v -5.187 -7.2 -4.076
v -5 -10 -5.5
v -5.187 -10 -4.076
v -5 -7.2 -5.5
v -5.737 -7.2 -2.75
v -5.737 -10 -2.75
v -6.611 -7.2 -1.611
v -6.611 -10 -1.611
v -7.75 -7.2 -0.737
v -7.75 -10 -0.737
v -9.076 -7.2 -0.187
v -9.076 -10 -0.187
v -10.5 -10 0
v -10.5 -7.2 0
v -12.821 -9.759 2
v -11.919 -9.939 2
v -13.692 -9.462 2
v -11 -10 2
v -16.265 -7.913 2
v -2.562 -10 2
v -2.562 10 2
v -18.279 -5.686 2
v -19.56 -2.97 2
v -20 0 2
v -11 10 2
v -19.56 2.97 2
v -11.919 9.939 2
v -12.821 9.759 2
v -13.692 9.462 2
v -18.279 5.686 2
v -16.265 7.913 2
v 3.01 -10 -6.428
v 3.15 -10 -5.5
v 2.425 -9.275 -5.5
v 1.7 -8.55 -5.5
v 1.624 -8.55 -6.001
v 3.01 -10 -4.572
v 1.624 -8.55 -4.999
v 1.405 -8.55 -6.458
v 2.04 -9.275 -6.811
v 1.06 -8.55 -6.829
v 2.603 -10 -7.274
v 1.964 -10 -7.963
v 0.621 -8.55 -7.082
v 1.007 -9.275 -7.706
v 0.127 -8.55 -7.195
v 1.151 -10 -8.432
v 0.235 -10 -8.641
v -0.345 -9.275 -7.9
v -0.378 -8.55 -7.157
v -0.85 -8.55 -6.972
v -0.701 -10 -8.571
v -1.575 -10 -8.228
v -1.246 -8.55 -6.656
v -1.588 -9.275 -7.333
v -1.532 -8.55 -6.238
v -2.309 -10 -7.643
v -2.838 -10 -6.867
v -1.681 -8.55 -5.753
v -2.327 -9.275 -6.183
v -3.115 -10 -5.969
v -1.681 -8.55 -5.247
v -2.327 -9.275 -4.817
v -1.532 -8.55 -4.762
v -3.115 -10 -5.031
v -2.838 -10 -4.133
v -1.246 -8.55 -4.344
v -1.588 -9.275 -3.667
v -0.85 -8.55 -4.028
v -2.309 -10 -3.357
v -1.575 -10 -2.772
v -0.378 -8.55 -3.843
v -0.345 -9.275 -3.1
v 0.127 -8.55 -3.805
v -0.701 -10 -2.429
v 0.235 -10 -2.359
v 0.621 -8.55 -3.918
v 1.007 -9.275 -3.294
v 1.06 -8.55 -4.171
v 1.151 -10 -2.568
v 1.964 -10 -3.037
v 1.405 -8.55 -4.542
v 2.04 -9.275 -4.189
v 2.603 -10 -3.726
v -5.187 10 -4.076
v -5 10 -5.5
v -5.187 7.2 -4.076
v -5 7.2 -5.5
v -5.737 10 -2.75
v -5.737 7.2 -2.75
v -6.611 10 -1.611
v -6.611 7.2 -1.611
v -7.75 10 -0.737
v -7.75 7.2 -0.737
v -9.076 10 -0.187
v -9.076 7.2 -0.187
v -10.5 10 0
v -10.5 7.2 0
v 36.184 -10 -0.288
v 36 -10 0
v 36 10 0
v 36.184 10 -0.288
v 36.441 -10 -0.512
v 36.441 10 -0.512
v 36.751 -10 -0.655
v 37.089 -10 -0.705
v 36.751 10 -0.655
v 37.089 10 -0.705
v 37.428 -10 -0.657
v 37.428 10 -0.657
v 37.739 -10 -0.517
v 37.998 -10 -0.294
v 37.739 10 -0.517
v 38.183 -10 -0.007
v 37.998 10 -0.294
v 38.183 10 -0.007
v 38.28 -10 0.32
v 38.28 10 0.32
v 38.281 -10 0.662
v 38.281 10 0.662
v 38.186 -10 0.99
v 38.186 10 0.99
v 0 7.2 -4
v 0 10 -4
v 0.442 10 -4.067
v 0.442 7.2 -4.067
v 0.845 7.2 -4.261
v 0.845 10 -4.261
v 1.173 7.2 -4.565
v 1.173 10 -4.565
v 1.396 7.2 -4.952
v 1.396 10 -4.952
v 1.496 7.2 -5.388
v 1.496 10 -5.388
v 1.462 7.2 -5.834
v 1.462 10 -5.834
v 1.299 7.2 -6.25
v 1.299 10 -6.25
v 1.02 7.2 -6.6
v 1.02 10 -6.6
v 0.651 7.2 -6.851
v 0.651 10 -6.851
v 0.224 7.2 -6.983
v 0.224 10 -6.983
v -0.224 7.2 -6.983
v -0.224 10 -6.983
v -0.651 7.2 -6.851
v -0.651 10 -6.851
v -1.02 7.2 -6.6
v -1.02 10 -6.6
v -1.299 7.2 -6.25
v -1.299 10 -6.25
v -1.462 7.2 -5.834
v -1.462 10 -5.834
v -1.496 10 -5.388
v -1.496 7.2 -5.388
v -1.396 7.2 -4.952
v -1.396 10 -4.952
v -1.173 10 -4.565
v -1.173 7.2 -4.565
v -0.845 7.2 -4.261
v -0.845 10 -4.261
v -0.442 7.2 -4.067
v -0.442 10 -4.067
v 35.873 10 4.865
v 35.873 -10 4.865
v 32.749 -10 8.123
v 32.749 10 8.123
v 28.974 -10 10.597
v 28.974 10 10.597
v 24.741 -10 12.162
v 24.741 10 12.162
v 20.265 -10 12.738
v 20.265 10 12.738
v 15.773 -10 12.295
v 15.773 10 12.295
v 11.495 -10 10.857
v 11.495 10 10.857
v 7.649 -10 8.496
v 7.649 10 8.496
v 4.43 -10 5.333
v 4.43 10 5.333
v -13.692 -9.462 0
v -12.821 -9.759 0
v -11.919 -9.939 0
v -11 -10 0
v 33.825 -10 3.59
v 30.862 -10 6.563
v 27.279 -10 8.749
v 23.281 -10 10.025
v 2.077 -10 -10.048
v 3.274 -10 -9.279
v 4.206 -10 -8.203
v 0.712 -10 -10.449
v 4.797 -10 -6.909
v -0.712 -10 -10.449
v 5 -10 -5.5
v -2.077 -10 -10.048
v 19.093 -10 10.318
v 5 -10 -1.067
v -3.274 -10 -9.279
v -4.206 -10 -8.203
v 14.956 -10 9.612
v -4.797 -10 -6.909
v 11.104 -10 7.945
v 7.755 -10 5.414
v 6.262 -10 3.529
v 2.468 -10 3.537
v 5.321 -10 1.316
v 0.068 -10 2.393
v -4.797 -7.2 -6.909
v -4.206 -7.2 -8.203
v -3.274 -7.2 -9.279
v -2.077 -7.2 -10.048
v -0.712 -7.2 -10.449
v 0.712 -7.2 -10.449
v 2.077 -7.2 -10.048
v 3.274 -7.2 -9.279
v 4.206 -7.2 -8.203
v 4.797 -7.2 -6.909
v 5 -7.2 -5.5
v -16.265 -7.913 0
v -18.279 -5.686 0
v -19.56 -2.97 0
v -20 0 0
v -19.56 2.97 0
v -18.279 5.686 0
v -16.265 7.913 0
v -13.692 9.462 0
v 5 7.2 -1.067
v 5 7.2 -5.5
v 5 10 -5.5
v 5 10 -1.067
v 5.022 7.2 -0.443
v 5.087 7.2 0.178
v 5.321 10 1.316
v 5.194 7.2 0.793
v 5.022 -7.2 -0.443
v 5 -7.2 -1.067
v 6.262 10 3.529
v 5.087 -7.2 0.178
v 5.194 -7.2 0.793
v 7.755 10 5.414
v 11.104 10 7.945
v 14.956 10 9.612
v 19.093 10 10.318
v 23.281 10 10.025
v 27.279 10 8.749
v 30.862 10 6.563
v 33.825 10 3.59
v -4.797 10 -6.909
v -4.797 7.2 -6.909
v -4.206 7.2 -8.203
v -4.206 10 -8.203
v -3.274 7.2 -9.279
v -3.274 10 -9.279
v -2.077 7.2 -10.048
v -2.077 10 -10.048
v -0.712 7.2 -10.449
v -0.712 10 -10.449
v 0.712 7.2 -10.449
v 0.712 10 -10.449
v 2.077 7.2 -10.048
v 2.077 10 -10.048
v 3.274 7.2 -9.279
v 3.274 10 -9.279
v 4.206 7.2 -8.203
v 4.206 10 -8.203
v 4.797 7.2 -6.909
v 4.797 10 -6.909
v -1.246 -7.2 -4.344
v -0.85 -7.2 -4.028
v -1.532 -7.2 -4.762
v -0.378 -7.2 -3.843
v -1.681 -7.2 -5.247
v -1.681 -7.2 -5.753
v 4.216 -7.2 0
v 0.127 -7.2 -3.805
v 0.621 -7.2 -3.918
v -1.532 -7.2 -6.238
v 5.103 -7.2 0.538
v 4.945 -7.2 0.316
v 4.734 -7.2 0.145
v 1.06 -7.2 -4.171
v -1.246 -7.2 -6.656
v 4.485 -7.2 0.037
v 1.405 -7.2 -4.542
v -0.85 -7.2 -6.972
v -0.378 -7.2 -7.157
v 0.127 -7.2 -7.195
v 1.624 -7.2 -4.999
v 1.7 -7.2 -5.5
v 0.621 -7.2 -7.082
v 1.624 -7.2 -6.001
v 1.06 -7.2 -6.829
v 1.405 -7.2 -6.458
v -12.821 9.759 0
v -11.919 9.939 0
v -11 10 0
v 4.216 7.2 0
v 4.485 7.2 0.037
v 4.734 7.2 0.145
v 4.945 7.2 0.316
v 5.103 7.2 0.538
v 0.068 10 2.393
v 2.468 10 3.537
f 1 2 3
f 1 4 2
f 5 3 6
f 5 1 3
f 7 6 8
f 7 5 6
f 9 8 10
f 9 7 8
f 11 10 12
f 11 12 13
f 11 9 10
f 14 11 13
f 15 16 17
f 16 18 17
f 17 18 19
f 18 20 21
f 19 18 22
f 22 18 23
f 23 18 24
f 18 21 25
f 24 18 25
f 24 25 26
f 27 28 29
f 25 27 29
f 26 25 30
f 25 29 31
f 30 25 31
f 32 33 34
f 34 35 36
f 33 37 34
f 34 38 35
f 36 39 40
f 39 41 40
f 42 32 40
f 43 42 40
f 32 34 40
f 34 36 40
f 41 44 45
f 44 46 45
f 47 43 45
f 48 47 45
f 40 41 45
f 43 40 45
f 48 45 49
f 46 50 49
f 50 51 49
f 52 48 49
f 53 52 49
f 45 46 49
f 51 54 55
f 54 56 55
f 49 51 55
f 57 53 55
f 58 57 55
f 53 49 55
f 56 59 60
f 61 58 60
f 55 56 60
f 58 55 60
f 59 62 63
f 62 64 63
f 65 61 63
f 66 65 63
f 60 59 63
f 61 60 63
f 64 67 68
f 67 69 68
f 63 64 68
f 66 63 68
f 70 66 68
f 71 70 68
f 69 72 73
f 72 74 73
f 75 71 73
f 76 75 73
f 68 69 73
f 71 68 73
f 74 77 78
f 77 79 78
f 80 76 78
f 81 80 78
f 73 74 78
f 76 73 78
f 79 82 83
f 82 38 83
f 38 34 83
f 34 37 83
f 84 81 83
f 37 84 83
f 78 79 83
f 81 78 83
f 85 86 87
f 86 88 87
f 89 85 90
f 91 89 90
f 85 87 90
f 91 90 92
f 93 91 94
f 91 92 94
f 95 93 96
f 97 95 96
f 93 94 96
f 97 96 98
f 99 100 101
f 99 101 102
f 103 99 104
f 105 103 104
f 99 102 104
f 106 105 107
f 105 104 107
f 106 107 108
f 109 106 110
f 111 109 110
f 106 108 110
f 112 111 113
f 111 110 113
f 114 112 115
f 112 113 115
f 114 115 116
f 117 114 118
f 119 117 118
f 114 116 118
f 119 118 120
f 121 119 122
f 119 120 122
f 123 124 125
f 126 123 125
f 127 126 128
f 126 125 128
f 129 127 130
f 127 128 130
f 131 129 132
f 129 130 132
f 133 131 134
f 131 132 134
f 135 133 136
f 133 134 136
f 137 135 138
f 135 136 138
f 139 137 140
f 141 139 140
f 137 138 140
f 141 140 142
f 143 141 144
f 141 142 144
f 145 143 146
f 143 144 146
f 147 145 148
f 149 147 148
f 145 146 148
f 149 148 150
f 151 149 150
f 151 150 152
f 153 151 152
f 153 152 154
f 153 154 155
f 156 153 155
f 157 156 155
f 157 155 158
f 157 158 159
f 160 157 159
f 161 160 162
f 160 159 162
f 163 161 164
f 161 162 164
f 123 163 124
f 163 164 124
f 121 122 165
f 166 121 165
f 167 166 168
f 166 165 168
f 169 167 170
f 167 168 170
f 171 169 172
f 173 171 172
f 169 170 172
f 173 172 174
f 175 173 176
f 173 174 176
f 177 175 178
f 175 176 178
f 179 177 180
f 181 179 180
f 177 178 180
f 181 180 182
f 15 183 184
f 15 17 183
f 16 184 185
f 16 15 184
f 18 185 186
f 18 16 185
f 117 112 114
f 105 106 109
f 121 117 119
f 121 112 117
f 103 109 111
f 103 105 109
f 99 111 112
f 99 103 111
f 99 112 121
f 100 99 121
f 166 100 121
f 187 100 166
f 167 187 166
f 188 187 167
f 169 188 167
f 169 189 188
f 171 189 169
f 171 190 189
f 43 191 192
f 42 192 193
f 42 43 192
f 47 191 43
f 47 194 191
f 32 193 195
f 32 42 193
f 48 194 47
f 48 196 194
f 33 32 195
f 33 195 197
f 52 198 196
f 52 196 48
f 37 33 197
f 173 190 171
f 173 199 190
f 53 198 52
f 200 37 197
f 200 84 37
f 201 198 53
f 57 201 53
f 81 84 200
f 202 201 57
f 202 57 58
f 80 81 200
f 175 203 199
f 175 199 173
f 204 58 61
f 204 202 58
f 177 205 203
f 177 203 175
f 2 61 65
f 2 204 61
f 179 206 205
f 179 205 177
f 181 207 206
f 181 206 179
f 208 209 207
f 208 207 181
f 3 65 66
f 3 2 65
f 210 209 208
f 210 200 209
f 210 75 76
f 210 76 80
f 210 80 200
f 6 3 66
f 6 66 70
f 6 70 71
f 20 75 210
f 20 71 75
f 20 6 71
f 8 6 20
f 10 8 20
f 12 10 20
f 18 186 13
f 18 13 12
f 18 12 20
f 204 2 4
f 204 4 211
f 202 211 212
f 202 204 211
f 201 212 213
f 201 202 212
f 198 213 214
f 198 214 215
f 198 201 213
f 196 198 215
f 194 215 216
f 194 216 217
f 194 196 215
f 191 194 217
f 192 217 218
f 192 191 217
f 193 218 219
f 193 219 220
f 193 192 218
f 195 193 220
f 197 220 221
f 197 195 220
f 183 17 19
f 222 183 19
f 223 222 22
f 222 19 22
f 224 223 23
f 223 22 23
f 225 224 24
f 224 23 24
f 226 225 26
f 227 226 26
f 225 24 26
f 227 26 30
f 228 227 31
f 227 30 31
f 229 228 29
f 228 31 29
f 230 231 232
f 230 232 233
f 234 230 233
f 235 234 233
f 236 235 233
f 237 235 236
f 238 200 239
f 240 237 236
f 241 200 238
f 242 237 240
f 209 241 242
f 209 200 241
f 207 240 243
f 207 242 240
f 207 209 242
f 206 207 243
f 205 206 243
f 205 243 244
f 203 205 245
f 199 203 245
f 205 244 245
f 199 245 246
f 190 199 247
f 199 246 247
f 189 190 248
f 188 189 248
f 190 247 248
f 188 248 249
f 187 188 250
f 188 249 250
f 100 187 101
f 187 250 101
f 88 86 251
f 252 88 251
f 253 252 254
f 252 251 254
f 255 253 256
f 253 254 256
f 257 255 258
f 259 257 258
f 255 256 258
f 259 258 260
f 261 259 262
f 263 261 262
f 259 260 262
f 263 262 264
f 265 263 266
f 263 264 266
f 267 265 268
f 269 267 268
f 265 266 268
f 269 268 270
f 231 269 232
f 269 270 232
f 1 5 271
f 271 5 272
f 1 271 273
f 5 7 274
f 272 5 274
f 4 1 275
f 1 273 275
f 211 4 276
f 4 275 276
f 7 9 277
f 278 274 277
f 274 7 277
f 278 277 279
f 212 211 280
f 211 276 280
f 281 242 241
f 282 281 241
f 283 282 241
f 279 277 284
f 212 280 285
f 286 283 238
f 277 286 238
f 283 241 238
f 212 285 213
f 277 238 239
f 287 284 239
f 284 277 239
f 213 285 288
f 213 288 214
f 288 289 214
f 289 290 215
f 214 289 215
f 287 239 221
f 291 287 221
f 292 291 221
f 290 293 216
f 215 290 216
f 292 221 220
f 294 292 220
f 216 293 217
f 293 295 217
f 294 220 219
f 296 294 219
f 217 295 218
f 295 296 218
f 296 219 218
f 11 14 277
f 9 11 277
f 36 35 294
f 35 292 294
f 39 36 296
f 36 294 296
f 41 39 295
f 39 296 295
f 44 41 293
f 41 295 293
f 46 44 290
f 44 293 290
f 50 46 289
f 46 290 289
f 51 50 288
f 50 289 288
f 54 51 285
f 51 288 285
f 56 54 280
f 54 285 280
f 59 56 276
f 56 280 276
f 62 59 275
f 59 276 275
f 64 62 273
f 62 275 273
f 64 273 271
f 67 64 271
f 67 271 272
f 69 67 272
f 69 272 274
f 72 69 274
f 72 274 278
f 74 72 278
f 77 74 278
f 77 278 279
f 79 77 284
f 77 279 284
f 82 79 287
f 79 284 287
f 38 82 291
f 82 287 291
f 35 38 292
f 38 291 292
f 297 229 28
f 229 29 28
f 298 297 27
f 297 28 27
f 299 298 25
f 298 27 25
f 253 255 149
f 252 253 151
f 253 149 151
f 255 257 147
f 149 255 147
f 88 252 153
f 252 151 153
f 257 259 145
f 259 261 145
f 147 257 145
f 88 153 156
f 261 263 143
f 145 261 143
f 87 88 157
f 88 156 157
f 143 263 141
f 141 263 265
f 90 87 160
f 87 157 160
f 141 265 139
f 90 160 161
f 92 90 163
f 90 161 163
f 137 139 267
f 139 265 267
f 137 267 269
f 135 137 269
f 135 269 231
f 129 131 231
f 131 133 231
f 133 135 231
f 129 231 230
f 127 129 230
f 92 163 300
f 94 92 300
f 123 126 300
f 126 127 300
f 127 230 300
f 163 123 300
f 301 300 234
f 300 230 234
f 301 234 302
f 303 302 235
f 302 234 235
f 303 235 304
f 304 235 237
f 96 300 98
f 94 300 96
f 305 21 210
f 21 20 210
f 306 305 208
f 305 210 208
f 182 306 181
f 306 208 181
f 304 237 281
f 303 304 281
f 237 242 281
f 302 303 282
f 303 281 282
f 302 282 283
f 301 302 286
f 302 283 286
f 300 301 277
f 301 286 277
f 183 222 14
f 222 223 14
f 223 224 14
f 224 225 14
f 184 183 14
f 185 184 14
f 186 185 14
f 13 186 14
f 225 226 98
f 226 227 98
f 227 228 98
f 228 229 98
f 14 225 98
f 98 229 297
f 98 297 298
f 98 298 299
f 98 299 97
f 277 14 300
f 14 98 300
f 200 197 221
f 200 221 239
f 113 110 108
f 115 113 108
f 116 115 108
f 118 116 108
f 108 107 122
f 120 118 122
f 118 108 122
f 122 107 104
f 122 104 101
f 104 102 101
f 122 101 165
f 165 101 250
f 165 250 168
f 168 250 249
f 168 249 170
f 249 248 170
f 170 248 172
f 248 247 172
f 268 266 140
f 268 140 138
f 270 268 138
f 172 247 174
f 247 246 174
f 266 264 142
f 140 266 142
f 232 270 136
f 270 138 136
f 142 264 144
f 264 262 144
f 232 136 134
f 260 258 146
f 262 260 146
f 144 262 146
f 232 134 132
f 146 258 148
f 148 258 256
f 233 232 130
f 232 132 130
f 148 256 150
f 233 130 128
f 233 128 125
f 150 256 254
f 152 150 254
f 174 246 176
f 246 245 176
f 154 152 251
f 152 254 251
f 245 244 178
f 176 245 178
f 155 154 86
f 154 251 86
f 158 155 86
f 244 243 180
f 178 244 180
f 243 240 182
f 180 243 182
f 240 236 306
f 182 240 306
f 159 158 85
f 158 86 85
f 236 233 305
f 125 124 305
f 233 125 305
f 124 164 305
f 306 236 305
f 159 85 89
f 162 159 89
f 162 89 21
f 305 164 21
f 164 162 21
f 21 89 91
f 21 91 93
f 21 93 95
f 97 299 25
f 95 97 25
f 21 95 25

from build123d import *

# Parameters (mm, degrees)
SKETCH1_W                                           = 17
SKETCH1_H                                           = 20
BOSS_EXTRUDE1_DEPTH                                 = 2
SKETCH2_R                                           = 1.5
BOSS_EXTRUDE2_DEPTH                                 = 2.8
FILLET1_R                                           = 5.5
FILLET1_OF_MIRROR1_R                                = 5.5
CSK_FOR_M3_COUNTERSUNK_FLAT_HEAD_SCREW1_D           = 3.4
CSK_FOR_M3_COUNTERSUNK_FLAT_HEAD_SCREW1_DEPTH       = 7
CSK_FOR_M3_COUNTERSUNK_FLAT_HEAD_SCREW1_CSINK_D     = 6.3
CSK_FOR_M3_COUNTERSUNK_FLAT_HEAD_SCREW1_CSINK_ANGLE = 90
CSK_FOR_M3_COUNTERSUNK_FLAT_HEAD_SCREW1_TIP         = 1.021463052
BOSS_EXTRUDE3_DEPTH                                 = 2
FILLET2_R                                           = 7
BOSS_EXTRUDE4_DEPTH                                 = 20
FILLET3_R                                           = 9
FILLET4_R                                           = 9
FILLET5_R                                           = 1


# Some blends are built 0.0001 mm under size
with BuildPart() as part:
    # Sketch1 → Boss-Extrude1 (new body)
    with BuildSketch(Plane.XY):
        with Locations((-3.5, 0)):
            Rectangle(SKETCH1_W, SKETCH1_H)
    extrude(amount=BOSS_EXTRUDE1_DEPTH)

    # Sketch2 → Boss-Extrude2 (add)
    with BuildSketch(Plane(origin=(0, 10, 0), x_dir=(1, 0, 0), z_dir=(0, 1, 0))):
        with BuildLine():
            Line((5, 0), (-5, 0))
            Line((-5, 0), (-5, 5.5))
            ThreePointArc((-5, 5.5), (0, 10.5), (5, 5.5))
            Line((5, 5.5), (5, 0))
        make_face()
        with Locations(Location((0, 5.5, 0), (0, 0, 270))):
            Circle(SKETCH2_R, mode=Mode.SUBTRACT)
    boss_extrude2 = extrude(amount=-BOSS_EXTRUDE2_DEPTH)

    # Fillet1
    fillet1_edges = [part.edges().sort_by_distance(p)[0] for p in [
        (-5, 8.6, 0),
    ]]
    fillet(fillet1_edges, radius=FILLET1_R - 0.0001)  # a hair under: the kernel refuses the full size

    # Mirror1: Boss-Extrude2 across plane
    add(boss_extrude2.mirror(Plane.ZX))

    # Fillet1 of Mirror1
    fillet1_of_mirror1_edges = [part.edges().sort_by_distance(p)[0] for p in [
        (-5, -8.6, 0),
    ]]
    fillet(fillet1_of_mirror1_edges, radius=FILLET1_OF_MIRROR1_R - 0.0001)  # a hair under: the kernel refuses the full size

    # CSK for M3 Countersunk Flat Head Screw1
    with Locations(Plane(origin=(0, -10, 0), x_dir=(-1, 0, 0), z_dir=(0, -1, 0))):
        with Locations((0, 5.5)):
            CounterSinkHole(CSK_FOR_M3_COUNTERSUNK_FLAT_HEAD_SCREW1_D / 2, CSK_FOR_M3_COUNTERSUNK_FLAT_HEAD_SCREW1_CSINK_D / 2, depth=CSK_FOR_M3_COUNTERSUNK_FLAT_HEAD_SCREW1_DEPTH, counter_sink_angle=CSK_FOR_M3_COUNTERSUNK_FLAT_HEAD_SCREW1_CSINK_ANGLE)
            with Locations((0, 0, -(CSK_FOR_M3_COUNTERSUNK_FLAT_HEAD_SCREW1_DEPTH + CSK_FOR_M3_COUNTERSUNK_FLAT_HEAD_SCREW1_TIP / 2))):  # 118° drill point
                Cone(0, CSK_FOR_M3_COUNTERSUNK_FLAT_HEAD_SCREW1_D / 2, CSK_FOR_M3_COUNTERSUNK_FLAT_HEAD_SCREW1_TIP, mode=Mode.SUBTRACT)

    # Sketch5 → Boss-Extrude3 (add)
    with BuildSketch(Plane.XY.offset(2)):
        with BuildLine():
            Line((-12, 10), (-12, -10))
            ThreePointArc((-12, -10), (-20, 0), (-12, 10))
        make_face()
    extrude(amount=-BOSS_EXTRUDE3_DEPTH)

    # Fillet2
    fillet2_edges = [part.edges().sort_by_distance(p)[0] for p in [
        (-12, -10, 1),
        (-12, 10, 1),
    ]]
    fillet(fillet2_edges, radius=FILLET2_R)

    # Sketch6 → Boss-Extrude4 (add)
    with BuildSketch(Plane(origin=(0, 10, 0), x_dir=(1, 0, 0), z_dir=(0, 1, 0))):
        with BuildLine():
            Line((2.239887411, -2), (4.367153275, -0.888811472))
            ThreePointArc((4.367153275, -0.888811472), (20.461428056, -10.333152259), (36, 0))
            ThreePointArc((36, 0), (37.588145554, 0.59815859), (38.186304144, -0.989986964))
            ThreePointArc((38.186304144, -0.989986964), (20.528836027, -12.73220544), (2.239887411, -2))
        make_face()
    extrude(amount=-BOSS_EXTRUDE4_DEPTH)

    # Fillet3
    # the kernel refuses this fillet: 9 mm, written as the material it adds along each edge
    with BuildSketch(Plane(origin=(5, -10, 2), x_dir=(0, 0, -1), z_dir=(0, 1, 0))) as fillet3_piece_1_section:
        with BuildLine():
            CenterArc((3.066869404, -9), FILLET3_R, 90, 46.064417531)
            ThreePointArc((-3.414213733, -2.755357386), (-1.793300325, -1.270874802), (0, 0))
            Line((0, 0), (3.066869404, 0))
        make_face()
    fillet3_piece_1 = extrude(amount=20, mode=Mode.PRIVATE)
    fillet3_piece_1 = split(fillet3_piece_1, bisect_by=Plane(origin=(4.921450274, -8.6, 0), z_dir=(0, 0, -1)), keep=Keep.TOP, mode=Mode.PRIVATE)
    fillet3_piece_1 = split(fillet3_piece_1, bisect_by=Plane(origin=(4.921450274, -7.2, -0.505403298), z_dir=(0, -1, 0)), keep=Keep.TOP, mode=Mode.PRIVATE)
    add(fillet3_piece_1)
    with BuildSketch(Plane(origin=(5, -10, 2), x_dir=(0, 0, -1), z_dir=(0, 1, 0))) as fillet3_piece_2_section:
        with BuildLine():
            CenterArc((3.066869404, -9), FILLET3_R, 90, 46.064417531)
            ThreePointArc((-3.414213733, -2.755357386), (-1.793300325, -1.270874802), (0, 0))
            Line((0, 0), (3.066869404, 0))
        make_face()
    fillet3_piece_2 = extrude(amount=20, mode=Mode.PRIVATE)
    fillet3_piece_2 = split(fillet3_piece_2, bisect_by=Plane(origin=(5.669505966, -8.6, 0), z_dir=(0, 0, 1)), keep=Keep.TOP, mode=Mode.PRIVATE)
    fillet3_piece_2 = split(fillet3_piece_2, bisect_by=Plane(origin=(5.669505966, -7.2, 2.571944176), z_dir=(0, -1, 0)), keep=Keep.TOP, mode=Mode.PRIVATE)
    add(fillet3_piece_2)
    with BuildSketch(Plane(origin=(5, -10, 2), x_dir=(0, 0, -1), z_dir=(0, 1, 0))) as fillet3_piece_3_section:
        with BuildLine():
            CenterArc((3.066869404, -9), FILLET3_R, 90, 46.064417531)
            ThreePointArc((-3.414213733, -2.755357386), (-1.793300325, -1.270874802), (0, 0))
            Line((0, 0), (3.066869404, 0))
        make_face()
    fillet3_piece_3 = extrude(amount=20, mode=Mode.PRIVATE)
    fillet3_piece_3 = split(fillet3_piece_3, bisect_by=Plane(origin=(5.669505966, 0, 0), z_dir=(0, 0, 1)), keep=Keep.TOP, mode=Mode.PRIVATE)
    fillet3_piece_3 = split(fillet3_piece_3, bisect_by=Plane(origin=(5.669505966, 7.2, 2.571944176), z_dir=(0, -1, 0)), keep=Keep.TOP, mode=Mode.PRIVATE)
    fillet3_piece_3 = split(fillet3_piece_3, bisect_by=Plane(origin=(5.669505966, -7.2, 2.571944176), z_dir=(0, 1, 0)), keep=Keep.TOP, mode=Mode.PRIVATE)
    add(fillet3_piece_3)
    with BuildSketch(Plane(origin=(5, -10, 2), x_dir=(0, 0, -1), z_dir=(0, 1, 0))) as fillet3_piece_4_section:
        with BuildLine():
            CenterArc((3.066869404, -9), FILLET3_R, 90, 46.064417531)
            ThreePointArc((-3.414213733, -2.755357386), (-1.793300325, -1.270874802), (0, 0))
            Line((0, 0), (3.066869404, 0))
        make_face()
    fillet3_piece_4 = extrude(amount=20, mode=Mode.PRIVATE)
    fillet3_piece_4 = split(fillet3_piece_4, bisect_by=Plane(origin=(4.921450274, 8.6, 0), z_dir=(0, 0, -1)), keep=Keep.TOP, mode=Mode.PRIVATE)
    fillet3_piece_4 = split(fillet3_piece_4, bisect_by=Plane(origin=(4.921450274, 7.2, -0.505403298), z_dir=(0, 1, 0)), keep=Keep.TOP, mode=Mode.PRIVATE)
    add(fillet3_piece_4)
    with BuildSketch(Plane(origin=(5, -10, 2), x_dir=(0, 0, -1), z_dir=(0, 1, 0))) as fillet3_piece_5_section:
        with BuildLine():
            CenterArc((3.066869404, -9), FILLET3_R, 90, 46.064417531)
            ThreePointArc((-3.414213733, -2.755357386), (-1.793300325, -1.270874802), (0, 0))
            Line((0, 0), (3.066869404, 0))
        make_face()
    fillet3_piece_5 = extrude(amount=20, mode=Mode.PRIVATE)
    fillet3_piece_5 = split(fillet3_piece_5, bisect_by=Plane(origin=(5.669505966, 8.6, 0), z_dir=(0, 0, 1)), keep=Keep.TOP, mode=Mode.PRIVATE)
    fillet3_piece_5 = split(fillet3_piece_5, bisect_by=Plane(origin=(5.669505966, 7.2, 2.571944176), z_dir=(0, 1, 0)), keep=Keep.TOP, mode=Mode.PRIVATE)
    add(fillet3_piece_5)

    # Fillet4
    fillet4_edges = [part.edges().sort_by_distance(p)[0] for p in [
        (2.239887411, 0, 2),
    ]]
    fillet(fillet4_edges, radius=FILLET4_R)

    # Fillet5
    fillet5_edges = [part.edges().sort_by_distance(p)[0] for p in [
        (5.063457622, 0, 0),
    ]]
    fillet(fillet5_edges, radius=FILLET5_R)


solid = part.part
